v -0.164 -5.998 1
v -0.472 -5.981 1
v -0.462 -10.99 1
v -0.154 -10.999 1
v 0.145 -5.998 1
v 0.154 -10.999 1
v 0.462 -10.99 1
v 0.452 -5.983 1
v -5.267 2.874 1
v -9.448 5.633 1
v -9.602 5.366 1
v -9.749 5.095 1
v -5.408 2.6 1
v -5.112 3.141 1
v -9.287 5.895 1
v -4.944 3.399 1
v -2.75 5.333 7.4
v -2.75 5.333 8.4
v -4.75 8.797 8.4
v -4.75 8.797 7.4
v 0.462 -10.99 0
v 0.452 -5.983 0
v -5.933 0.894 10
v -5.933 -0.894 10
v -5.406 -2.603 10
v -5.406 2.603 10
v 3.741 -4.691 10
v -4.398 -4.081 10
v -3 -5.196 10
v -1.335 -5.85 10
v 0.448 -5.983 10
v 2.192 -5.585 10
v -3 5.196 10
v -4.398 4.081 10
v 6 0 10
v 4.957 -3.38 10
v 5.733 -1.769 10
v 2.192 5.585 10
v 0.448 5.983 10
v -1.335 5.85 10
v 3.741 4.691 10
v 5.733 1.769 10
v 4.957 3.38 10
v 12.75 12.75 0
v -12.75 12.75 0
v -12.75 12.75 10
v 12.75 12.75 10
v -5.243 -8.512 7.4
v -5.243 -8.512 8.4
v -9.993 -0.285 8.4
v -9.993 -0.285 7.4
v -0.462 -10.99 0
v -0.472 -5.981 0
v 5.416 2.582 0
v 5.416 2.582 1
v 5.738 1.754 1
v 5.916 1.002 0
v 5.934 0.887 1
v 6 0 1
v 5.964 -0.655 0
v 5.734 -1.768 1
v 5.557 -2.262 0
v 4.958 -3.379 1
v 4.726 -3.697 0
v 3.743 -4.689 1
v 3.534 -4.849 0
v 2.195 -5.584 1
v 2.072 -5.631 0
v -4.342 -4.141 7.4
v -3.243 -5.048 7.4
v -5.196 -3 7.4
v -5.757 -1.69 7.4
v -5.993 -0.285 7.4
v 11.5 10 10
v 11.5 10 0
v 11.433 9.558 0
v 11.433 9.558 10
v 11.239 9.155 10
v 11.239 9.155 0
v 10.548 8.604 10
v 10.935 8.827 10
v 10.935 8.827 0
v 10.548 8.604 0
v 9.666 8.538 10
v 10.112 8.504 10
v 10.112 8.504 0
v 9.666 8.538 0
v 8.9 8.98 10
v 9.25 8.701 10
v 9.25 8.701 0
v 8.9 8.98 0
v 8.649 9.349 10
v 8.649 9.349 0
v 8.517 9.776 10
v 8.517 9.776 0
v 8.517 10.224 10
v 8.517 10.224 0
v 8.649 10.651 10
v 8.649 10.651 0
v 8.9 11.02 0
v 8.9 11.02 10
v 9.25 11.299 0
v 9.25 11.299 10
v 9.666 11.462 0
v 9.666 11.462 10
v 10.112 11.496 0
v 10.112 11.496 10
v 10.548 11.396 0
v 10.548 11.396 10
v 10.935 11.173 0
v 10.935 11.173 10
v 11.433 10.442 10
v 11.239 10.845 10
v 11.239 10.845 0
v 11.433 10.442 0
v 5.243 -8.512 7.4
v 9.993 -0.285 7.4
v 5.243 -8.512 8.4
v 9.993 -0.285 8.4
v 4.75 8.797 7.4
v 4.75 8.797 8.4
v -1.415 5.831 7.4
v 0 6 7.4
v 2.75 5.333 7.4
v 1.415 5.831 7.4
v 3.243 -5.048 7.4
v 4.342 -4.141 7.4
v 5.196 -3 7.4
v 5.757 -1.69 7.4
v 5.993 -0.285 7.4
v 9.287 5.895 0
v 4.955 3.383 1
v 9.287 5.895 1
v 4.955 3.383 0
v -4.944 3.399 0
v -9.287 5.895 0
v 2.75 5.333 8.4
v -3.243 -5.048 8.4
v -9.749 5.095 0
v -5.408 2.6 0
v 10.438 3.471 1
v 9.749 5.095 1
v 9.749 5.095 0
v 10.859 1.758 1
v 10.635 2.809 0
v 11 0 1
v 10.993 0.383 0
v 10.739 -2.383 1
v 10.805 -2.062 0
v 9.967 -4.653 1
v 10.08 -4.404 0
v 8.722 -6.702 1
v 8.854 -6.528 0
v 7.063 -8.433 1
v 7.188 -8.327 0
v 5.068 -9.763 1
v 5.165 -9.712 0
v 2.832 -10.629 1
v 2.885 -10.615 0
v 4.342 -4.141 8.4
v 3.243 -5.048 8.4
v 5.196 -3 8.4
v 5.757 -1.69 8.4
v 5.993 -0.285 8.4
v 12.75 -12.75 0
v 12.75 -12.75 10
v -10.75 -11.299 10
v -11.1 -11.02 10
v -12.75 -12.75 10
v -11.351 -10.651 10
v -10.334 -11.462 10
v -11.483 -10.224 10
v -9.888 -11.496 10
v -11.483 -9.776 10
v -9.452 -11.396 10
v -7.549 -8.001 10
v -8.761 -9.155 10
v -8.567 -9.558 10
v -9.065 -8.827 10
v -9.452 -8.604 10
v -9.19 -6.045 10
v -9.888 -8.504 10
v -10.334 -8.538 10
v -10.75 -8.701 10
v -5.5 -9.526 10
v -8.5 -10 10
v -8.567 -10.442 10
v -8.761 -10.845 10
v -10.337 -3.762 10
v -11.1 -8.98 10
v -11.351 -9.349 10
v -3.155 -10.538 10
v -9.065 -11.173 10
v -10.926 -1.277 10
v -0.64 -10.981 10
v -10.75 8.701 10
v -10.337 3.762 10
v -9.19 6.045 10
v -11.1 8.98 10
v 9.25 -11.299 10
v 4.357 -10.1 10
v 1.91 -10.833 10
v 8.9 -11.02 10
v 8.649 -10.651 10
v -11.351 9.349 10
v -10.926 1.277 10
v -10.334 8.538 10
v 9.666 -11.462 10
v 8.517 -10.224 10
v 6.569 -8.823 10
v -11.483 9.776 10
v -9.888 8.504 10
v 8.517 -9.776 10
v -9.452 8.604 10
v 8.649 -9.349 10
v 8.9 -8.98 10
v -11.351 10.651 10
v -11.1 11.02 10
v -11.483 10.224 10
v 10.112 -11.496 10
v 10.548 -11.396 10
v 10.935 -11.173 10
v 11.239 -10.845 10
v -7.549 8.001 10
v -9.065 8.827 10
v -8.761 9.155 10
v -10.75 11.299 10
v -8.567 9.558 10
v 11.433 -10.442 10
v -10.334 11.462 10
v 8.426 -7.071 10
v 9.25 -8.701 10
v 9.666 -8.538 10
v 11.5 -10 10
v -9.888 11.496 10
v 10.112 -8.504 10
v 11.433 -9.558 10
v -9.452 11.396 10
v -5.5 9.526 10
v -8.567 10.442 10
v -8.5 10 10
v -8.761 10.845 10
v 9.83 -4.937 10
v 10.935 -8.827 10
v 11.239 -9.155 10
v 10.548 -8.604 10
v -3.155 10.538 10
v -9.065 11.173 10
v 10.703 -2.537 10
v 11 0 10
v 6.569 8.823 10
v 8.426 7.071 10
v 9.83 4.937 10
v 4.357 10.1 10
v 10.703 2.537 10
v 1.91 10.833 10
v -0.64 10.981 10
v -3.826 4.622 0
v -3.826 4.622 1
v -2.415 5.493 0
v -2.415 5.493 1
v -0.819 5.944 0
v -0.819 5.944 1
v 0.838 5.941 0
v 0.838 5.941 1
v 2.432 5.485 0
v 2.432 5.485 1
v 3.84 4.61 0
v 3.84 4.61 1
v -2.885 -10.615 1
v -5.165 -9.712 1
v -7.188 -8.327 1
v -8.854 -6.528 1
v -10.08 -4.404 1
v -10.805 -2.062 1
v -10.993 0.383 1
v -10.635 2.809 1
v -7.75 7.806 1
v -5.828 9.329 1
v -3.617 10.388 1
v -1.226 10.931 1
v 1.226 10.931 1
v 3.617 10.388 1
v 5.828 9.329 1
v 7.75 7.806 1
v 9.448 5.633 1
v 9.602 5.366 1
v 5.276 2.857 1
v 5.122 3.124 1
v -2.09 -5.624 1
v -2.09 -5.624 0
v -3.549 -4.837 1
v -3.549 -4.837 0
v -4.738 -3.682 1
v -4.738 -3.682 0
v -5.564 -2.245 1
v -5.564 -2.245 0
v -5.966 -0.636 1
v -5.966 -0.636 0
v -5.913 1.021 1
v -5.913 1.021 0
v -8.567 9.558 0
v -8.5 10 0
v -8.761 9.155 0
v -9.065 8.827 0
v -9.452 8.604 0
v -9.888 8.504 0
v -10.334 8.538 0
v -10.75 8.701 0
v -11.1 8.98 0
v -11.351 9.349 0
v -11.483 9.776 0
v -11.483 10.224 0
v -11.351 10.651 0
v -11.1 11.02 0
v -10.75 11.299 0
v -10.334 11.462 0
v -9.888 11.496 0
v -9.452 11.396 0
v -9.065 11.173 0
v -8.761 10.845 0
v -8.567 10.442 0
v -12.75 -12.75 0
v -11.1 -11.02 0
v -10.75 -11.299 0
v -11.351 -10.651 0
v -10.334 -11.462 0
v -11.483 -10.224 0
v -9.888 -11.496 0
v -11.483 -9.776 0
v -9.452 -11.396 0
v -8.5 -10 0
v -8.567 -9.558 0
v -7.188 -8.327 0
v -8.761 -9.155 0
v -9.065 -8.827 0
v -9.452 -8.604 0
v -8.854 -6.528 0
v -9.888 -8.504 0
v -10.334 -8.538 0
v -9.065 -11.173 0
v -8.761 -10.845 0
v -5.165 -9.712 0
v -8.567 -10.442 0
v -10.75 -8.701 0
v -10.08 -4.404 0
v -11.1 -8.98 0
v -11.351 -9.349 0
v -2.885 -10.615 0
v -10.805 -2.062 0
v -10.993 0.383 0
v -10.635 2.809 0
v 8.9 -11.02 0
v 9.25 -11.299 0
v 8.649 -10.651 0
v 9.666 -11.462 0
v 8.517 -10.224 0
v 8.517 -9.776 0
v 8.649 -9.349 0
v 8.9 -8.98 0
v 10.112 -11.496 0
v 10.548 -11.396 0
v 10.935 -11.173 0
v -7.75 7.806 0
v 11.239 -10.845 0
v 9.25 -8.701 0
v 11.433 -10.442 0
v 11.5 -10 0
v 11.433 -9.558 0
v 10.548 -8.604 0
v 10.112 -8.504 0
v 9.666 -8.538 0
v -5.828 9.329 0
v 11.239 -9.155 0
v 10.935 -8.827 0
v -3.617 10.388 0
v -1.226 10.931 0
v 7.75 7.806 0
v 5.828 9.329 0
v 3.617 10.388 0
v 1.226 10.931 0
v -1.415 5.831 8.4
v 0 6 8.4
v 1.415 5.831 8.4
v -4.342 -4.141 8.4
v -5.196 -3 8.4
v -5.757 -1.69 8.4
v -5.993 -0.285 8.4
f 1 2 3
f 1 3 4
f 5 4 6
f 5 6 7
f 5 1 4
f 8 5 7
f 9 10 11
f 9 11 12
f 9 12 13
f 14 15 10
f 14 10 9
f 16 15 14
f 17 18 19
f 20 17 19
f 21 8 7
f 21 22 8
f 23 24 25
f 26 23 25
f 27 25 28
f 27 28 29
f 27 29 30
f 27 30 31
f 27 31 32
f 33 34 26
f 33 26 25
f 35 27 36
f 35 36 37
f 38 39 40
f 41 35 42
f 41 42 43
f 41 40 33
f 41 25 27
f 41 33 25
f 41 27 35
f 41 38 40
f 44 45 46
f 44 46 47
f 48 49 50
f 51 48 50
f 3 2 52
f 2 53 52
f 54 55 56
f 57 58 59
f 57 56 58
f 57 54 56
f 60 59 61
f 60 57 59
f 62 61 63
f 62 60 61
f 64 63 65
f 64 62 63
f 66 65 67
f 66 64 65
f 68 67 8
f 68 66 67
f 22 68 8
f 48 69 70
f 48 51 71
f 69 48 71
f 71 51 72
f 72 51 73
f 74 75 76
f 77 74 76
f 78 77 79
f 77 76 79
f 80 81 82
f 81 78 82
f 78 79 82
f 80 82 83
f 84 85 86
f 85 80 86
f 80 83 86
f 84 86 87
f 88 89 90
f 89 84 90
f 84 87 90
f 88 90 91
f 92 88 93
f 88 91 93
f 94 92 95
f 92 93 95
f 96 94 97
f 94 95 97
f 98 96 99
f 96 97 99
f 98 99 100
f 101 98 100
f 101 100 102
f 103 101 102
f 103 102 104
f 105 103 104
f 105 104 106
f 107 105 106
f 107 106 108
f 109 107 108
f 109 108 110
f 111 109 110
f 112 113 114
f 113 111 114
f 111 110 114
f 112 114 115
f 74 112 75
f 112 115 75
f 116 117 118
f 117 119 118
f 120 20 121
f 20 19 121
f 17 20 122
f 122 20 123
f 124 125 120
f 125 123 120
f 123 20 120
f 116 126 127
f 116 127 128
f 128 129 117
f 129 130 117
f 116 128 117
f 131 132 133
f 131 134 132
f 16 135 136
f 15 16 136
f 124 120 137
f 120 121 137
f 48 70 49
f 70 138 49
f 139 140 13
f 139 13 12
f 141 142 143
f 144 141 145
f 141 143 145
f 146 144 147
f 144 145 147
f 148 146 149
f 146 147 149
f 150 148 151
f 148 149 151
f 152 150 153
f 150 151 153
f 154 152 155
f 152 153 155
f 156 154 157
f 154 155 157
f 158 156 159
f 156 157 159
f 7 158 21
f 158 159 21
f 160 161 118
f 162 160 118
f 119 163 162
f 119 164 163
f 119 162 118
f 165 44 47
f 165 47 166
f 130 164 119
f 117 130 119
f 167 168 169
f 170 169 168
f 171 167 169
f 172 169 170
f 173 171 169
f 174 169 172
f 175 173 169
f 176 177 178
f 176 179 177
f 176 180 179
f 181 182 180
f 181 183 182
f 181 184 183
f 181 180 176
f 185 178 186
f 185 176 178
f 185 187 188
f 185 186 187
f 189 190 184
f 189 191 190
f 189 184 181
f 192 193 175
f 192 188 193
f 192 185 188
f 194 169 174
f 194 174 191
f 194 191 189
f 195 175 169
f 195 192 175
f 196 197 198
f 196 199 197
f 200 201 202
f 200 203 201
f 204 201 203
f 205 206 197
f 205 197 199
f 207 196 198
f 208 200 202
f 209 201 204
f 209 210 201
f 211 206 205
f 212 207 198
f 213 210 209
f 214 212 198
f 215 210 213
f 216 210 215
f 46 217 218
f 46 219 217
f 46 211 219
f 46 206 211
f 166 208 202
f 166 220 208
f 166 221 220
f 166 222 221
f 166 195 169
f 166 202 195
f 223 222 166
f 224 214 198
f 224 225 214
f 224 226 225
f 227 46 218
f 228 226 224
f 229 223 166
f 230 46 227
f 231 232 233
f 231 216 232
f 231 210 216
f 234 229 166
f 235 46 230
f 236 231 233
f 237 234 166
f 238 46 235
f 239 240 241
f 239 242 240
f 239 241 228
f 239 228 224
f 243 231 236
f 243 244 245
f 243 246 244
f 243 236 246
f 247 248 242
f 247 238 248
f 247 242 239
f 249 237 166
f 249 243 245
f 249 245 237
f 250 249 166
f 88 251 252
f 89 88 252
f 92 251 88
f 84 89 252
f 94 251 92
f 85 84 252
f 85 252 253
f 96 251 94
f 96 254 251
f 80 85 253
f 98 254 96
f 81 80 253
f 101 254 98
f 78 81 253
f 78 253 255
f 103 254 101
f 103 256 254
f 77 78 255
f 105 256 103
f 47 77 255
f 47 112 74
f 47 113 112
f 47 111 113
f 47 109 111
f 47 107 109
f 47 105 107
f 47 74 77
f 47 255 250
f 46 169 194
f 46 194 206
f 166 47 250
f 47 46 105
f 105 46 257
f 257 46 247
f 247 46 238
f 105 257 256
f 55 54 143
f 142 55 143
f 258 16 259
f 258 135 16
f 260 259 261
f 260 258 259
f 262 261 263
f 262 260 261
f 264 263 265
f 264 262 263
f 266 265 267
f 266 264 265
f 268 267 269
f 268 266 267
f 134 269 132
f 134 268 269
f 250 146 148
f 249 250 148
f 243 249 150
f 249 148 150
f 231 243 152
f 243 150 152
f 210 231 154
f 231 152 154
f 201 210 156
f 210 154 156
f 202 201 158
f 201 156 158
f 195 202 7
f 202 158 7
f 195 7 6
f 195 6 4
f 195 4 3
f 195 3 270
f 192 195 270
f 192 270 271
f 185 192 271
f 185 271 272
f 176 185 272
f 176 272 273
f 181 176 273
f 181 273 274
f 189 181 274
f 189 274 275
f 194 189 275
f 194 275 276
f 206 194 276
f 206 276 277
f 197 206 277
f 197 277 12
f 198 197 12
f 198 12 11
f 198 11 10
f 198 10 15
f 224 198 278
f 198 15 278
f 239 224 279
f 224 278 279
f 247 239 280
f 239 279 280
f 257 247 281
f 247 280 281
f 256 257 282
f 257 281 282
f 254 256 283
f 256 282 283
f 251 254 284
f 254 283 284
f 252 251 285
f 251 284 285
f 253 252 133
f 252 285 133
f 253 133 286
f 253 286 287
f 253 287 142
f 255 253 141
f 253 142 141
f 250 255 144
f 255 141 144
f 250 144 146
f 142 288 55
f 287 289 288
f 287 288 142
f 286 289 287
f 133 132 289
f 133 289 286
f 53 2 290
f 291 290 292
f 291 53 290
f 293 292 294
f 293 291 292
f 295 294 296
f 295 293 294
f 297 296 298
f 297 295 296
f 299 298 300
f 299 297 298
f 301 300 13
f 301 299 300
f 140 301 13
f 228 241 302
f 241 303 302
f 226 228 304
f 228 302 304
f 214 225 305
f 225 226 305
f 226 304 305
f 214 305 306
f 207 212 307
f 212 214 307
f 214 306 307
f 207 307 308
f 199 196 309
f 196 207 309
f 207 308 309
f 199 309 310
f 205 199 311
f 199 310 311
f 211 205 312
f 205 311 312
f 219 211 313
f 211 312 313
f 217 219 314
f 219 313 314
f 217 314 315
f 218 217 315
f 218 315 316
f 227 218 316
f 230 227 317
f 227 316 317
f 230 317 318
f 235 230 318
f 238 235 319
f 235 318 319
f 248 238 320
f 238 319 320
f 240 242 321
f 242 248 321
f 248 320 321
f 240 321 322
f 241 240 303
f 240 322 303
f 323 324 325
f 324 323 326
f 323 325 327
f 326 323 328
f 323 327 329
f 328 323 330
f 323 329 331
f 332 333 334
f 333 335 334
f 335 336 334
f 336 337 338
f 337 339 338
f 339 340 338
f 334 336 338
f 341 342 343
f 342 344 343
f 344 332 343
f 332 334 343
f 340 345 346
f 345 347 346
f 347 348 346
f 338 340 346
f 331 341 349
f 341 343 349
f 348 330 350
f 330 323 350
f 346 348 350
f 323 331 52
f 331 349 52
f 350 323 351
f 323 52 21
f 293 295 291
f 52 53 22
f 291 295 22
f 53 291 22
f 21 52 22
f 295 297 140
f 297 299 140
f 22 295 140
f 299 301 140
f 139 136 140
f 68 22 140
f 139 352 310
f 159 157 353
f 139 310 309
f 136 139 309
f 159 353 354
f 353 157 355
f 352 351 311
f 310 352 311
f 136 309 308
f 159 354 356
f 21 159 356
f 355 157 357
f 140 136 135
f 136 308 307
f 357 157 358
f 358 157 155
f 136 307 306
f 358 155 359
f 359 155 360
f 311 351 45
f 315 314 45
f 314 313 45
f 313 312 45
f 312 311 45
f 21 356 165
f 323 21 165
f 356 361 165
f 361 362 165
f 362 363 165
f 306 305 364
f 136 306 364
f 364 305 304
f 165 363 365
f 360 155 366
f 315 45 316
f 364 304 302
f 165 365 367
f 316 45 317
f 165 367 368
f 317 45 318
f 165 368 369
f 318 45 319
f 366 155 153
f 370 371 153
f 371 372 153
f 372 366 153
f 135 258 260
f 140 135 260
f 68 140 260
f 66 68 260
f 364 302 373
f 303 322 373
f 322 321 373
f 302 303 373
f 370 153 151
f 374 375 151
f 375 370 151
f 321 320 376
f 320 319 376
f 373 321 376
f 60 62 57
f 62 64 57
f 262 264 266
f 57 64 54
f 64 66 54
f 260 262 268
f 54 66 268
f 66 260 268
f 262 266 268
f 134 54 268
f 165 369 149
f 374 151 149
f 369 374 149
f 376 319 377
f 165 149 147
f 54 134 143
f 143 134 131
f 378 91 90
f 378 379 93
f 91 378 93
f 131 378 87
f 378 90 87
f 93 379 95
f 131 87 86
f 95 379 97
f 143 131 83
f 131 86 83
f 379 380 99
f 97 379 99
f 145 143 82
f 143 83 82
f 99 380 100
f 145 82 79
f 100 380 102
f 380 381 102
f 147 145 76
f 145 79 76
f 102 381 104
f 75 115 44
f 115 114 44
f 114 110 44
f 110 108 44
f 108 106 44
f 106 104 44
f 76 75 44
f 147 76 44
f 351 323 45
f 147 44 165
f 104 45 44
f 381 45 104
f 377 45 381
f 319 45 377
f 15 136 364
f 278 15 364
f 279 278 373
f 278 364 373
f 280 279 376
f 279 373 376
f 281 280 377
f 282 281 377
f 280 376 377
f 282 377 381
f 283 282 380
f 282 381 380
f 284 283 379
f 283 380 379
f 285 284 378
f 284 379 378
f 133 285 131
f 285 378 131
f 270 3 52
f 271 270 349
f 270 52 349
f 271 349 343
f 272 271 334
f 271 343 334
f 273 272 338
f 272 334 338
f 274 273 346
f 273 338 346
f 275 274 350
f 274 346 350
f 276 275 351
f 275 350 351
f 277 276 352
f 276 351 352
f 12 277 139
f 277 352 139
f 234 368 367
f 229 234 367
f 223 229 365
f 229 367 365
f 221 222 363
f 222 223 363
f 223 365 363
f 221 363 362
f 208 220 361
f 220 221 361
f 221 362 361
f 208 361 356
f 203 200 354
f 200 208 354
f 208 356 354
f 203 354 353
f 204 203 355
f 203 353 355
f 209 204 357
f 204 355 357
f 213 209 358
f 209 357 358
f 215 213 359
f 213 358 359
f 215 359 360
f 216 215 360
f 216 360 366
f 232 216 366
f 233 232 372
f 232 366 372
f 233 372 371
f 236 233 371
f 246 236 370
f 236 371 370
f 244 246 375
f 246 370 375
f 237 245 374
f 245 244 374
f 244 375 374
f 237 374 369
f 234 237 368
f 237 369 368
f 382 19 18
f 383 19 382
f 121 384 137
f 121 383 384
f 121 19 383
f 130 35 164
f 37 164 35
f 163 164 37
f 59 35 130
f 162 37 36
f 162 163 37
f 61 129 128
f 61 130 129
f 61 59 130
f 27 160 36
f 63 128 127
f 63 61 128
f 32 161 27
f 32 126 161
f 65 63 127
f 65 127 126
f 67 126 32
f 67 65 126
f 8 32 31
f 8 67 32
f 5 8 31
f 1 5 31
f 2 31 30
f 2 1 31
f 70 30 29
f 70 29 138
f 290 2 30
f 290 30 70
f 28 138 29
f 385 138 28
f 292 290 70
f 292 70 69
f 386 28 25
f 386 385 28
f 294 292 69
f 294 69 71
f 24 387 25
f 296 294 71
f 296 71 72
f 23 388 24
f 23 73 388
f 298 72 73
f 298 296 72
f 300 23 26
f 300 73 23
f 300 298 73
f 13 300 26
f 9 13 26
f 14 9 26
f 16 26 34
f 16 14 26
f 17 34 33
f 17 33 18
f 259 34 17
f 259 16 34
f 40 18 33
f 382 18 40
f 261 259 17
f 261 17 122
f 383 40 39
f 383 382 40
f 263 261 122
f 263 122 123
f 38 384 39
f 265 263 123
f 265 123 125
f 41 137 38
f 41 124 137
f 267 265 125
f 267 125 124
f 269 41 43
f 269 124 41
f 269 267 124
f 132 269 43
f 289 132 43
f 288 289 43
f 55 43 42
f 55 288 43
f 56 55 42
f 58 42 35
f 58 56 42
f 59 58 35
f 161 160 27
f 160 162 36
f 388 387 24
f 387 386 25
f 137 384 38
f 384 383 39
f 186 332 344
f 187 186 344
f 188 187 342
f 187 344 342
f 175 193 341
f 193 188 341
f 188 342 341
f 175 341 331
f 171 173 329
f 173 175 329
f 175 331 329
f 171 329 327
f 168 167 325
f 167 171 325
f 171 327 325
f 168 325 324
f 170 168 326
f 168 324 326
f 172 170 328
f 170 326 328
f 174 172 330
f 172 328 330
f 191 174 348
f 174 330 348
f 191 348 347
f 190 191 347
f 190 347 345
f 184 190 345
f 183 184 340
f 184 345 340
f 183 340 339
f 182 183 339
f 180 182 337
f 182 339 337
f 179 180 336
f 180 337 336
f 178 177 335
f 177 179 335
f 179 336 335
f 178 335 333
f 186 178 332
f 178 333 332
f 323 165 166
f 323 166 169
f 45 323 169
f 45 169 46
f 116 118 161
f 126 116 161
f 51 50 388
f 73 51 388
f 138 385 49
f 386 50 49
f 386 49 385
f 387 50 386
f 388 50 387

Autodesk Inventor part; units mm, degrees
ref_plane "YZ Plane" through (0, 0, 0) normal (1, 0, 0) x (0, 1, 0)
ref_plane "XZ Plane" through (0, 0, 0) normal (0, 1, 0) x (-1, 0, 0)
sketch "Sketch1" plane through (0, 0, 0) normal (0, 0, 1) x (1, 0, 0)
  line L0 (0, -17.85) -> (0, 17.85) construction
  line L1 (-17.85, 0) -> (17.85, 0) construction
  line L2 (-12.75, 12.75) -> (12.75, 12.75)
  line L3 (12.75, 12.75) -> (12.75, -12.75)
  line L4 (12.75, -12.75) -> (-12.75, -12.75)
  line L5 (-12.75, -12.75) -> (-12.75, 12.75)
  line L6 (-12.75, 12.75) -> (12.75, -12.75) construction
  line L7 (12.75, 12.75) -> (-12.75, -12.75) construction
  circle A0 centre (-10, -10) radius 1.5
  circle A1 centre (10, -10) radius 1.5
  circle A2 centre (-10, 10) radius 1.5
  circle A3 centre (10, 10) radius 1.5
  circle A4 centre (0, 0) radius 6
  circle A5 centre (0, 0) radius 11
  dimension "d0" = 25.5
  dimension "d1" = 25.5
  dimension "d2" = 3
  dimension "d3" = 3
  dimension "d4" = 20
  dimension "d5" = 2.75
  dimension "d7" = 2.75
  dimension "d8" = 2.75
  dimension "d9" = 12
  dimension "d10" = 22
extrude "Extrusion1" add sketch "Sketch1" along normal blind 10
extrude "Extrusion2" add sketch "Sketch1" along normal blind 1 contours A5
sketch "Sketch3" plane through (0, 0, 0) normal (0, 0, -1) x (-1, 0, 0)
  circle A0 centre (0, 0) radius 6 projected
  line L0 (-5.4158, 2.5824) -> (-9.7489, 5.095)
  circle A1 centre (0, 0) radius 11 projected
  line L1 (-4.9551, 3.3833) -> (-9.2869, 5.8953)
  line L2 (0.4715, -5.9814) -> (0.462, -10.9903)
  line L3 (-0.4525, -5.9829) -> (-0.462, -10.9903)
  line L4 (4.9443, 3.399) -> (9.2869, 5.8953)
  line L5 (5.4076, 2.5996) -> (9.7489, 5.095)
  dimension "d17" = 0.924
  dimension "d18" = 0.924
  dimension "d21" = 360
  dimension "d23" = 120
  dimension "d24" = 0.924
extrude "Extrusion3" cut sketch "Sketch3" against normal blind 1 contours A0 L5 A1 L2 | A0 L1 A1 L4 | L3 A1 L0 A0
ref_plane "Work Plane1" through (0, 0, 8.4) normal (0, 0, 1) x (1, 0, 0)
sketch "Sketch4" plane through (0, 0, 8.4) normal (0, 0, 1) x (1, 0, 0)
  circle A0 centre (0, 0) radius 6 projected
  line L0 (-2.75, 5.3327) -> (-4.75, 8.7968)
  line L1 (-4.75, 8.7968) -> (4.75, 8.7968)
  line L2 (4.75, 8.7968) -> (2.75, 5.3327)
  line L3 (-12.75, 12.75) -> (-12.75, -12.75) projected
  line L4 (12.75, -12.75) -> (12.75, 12.75) projected
  line L5 (-3.2432, -5.0479) -> (-5.2432, -8.512)
  line L6 (-5.2432, -8.512) -> (-9.9932, -0.2848)
  line L7 (-9.9932, -0.2848) -> (-5.9932, -0.2848)
  line L8 (5.9932, -0.2848) -> (9.9932, -0.2848)
  line L9 (9.9932, -0.2848) -> (5.2432, -8.512)
  line L10 (5.2432, -8.512) -> (3.2432, -5.0479)
  dimension "d28" = 8
  dimension "d29" = 8
  dimension "d30" = 10
  dimension "d31" = 60
  dimension "d32" = 60
  dimension "d35" = 360
extrude "Extrusion4" add sketch "Sketch4" against normal blind 1 contours A0 L0 L1 L2 | L8 L9 L10 A0 | A0 L5 L6 L7
properties part number "maly_wentylator"
